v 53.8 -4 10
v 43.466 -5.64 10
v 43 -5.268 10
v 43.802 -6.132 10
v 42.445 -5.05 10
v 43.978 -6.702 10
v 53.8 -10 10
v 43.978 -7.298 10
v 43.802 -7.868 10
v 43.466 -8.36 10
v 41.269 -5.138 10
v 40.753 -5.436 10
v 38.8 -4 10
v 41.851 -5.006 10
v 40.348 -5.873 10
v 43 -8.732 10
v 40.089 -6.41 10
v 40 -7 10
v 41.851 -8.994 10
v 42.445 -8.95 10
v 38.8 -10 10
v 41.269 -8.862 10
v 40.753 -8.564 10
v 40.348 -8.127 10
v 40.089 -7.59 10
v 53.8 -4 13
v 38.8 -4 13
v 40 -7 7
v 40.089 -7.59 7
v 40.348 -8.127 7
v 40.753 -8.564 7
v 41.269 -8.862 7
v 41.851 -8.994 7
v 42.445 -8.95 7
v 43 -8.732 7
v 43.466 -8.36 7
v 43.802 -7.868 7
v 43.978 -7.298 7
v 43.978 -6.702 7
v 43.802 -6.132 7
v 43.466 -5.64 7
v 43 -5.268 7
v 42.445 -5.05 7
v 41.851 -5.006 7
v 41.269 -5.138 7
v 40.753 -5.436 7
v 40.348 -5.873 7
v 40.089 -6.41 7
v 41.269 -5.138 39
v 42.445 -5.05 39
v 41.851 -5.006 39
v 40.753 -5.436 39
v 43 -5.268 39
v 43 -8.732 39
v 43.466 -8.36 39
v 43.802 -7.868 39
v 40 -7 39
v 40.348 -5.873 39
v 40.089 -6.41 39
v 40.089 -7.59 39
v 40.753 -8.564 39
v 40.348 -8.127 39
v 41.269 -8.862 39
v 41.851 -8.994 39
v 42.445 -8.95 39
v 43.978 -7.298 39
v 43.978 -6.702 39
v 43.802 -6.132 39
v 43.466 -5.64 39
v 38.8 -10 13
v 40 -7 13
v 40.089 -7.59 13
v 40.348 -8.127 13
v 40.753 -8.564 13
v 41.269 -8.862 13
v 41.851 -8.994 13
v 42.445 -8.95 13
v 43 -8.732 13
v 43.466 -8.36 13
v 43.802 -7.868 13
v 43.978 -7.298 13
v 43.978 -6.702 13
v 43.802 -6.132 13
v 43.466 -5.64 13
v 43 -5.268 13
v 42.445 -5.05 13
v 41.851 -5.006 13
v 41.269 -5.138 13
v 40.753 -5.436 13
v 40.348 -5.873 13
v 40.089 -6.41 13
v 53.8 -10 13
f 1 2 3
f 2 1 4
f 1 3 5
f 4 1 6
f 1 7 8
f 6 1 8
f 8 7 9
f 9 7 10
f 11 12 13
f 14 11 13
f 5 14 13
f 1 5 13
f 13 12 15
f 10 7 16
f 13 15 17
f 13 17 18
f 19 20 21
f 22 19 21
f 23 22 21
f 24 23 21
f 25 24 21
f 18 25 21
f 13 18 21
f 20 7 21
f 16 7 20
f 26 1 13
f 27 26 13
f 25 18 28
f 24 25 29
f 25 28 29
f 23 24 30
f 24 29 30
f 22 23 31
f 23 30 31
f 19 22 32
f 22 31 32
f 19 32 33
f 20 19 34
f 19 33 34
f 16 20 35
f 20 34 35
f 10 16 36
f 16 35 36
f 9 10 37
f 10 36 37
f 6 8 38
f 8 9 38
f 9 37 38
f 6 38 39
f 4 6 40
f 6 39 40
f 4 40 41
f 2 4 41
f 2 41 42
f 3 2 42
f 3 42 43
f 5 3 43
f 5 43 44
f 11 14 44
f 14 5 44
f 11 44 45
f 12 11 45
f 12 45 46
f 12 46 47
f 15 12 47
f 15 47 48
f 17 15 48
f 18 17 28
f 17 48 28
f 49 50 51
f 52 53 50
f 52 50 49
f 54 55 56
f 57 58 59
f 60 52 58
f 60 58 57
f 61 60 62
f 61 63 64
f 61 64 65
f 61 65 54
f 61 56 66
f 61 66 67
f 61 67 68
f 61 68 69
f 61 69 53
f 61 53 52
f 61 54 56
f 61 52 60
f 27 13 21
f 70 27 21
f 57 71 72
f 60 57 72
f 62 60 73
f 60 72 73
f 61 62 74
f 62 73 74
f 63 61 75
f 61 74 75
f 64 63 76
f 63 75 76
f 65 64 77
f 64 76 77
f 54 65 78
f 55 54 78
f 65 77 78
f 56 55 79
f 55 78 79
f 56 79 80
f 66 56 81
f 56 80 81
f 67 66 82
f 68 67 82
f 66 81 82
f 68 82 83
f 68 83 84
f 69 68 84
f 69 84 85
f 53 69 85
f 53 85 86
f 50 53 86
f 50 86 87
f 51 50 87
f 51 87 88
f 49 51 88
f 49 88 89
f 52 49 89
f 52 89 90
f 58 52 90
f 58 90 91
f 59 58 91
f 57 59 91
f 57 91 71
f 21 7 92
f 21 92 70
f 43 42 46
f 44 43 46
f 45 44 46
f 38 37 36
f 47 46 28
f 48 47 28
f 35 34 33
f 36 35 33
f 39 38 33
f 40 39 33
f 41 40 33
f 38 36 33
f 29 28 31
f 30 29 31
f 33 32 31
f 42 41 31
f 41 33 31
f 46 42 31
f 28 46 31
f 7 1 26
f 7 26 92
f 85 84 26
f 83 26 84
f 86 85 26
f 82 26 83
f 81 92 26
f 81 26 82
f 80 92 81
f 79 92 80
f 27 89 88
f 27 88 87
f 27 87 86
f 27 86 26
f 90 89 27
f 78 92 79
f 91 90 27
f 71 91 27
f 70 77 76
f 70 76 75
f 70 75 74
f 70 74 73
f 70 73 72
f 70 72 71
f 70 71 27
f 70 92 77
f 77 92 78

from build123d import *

# Parameters (mm, degrees)
BOX018_W                  = 15
BOX018_H                  = 6
BOX018_DEPTH              = 3
CYLINDER058_R             = 1.5
CYLINDER058_DEPTH         = 25
CYLINDER057_R             = 2
CYLINDER057_DEPTH         = 32
FUSION041_PLACEMENT_ANGLE = 180


with BuildPart() as cube015:
    # Box018 → Box018 (new body)
    with BuildSketch(Plane(origin=(58.2, 67, 3), x_dir=(1, 0, 0), z_dir=(0, 0, 1))):
        with Locations((7.5, 3)):
            Rectangle(BOX018_W, BOX018_H)
    extrude(amount=BOX018_DEPTH)


with BuildPart() as cylinder058:
    # Cylinder058 → Cylinder058 (new body)
    with BuildSketch(Plane(origin=(70, 70, 7), x_dir=(1, 0, 0), z_dir=(0, 0, 1))):
        Circle(CYLINDER058_R)
    extrude(amount=CYLINDER058_DEPTH)


with BuildPart() as bohrungfanductupper001:
    # Cylinder057 → Cylinder057 (new body)
    with BuildSketch(Plane(origin=(70, 70, 0), x_dir=(1, 0, 0), z_dir=(0, 0, 1))):
        Circle(CYLINDER057_R)
    extrude(amount=CYLINDER057_DEPTH)

    # Fusion041: union Cube015, Cylinder058
    add(cube015.part)
    add(cylinder058.part)


with BuildPart() as bohrungfanductupper001_1:
    # Fusion041 placement: moved
    add(bohrungfanductupper001.part.moved(Location((112, 63, 7))).rotate(Axis((112, 63, 7), (0, 0, 1)), FUSION041_PLACEMENT_ANGLE))


solid = bohrungfanductupper001_1.part
